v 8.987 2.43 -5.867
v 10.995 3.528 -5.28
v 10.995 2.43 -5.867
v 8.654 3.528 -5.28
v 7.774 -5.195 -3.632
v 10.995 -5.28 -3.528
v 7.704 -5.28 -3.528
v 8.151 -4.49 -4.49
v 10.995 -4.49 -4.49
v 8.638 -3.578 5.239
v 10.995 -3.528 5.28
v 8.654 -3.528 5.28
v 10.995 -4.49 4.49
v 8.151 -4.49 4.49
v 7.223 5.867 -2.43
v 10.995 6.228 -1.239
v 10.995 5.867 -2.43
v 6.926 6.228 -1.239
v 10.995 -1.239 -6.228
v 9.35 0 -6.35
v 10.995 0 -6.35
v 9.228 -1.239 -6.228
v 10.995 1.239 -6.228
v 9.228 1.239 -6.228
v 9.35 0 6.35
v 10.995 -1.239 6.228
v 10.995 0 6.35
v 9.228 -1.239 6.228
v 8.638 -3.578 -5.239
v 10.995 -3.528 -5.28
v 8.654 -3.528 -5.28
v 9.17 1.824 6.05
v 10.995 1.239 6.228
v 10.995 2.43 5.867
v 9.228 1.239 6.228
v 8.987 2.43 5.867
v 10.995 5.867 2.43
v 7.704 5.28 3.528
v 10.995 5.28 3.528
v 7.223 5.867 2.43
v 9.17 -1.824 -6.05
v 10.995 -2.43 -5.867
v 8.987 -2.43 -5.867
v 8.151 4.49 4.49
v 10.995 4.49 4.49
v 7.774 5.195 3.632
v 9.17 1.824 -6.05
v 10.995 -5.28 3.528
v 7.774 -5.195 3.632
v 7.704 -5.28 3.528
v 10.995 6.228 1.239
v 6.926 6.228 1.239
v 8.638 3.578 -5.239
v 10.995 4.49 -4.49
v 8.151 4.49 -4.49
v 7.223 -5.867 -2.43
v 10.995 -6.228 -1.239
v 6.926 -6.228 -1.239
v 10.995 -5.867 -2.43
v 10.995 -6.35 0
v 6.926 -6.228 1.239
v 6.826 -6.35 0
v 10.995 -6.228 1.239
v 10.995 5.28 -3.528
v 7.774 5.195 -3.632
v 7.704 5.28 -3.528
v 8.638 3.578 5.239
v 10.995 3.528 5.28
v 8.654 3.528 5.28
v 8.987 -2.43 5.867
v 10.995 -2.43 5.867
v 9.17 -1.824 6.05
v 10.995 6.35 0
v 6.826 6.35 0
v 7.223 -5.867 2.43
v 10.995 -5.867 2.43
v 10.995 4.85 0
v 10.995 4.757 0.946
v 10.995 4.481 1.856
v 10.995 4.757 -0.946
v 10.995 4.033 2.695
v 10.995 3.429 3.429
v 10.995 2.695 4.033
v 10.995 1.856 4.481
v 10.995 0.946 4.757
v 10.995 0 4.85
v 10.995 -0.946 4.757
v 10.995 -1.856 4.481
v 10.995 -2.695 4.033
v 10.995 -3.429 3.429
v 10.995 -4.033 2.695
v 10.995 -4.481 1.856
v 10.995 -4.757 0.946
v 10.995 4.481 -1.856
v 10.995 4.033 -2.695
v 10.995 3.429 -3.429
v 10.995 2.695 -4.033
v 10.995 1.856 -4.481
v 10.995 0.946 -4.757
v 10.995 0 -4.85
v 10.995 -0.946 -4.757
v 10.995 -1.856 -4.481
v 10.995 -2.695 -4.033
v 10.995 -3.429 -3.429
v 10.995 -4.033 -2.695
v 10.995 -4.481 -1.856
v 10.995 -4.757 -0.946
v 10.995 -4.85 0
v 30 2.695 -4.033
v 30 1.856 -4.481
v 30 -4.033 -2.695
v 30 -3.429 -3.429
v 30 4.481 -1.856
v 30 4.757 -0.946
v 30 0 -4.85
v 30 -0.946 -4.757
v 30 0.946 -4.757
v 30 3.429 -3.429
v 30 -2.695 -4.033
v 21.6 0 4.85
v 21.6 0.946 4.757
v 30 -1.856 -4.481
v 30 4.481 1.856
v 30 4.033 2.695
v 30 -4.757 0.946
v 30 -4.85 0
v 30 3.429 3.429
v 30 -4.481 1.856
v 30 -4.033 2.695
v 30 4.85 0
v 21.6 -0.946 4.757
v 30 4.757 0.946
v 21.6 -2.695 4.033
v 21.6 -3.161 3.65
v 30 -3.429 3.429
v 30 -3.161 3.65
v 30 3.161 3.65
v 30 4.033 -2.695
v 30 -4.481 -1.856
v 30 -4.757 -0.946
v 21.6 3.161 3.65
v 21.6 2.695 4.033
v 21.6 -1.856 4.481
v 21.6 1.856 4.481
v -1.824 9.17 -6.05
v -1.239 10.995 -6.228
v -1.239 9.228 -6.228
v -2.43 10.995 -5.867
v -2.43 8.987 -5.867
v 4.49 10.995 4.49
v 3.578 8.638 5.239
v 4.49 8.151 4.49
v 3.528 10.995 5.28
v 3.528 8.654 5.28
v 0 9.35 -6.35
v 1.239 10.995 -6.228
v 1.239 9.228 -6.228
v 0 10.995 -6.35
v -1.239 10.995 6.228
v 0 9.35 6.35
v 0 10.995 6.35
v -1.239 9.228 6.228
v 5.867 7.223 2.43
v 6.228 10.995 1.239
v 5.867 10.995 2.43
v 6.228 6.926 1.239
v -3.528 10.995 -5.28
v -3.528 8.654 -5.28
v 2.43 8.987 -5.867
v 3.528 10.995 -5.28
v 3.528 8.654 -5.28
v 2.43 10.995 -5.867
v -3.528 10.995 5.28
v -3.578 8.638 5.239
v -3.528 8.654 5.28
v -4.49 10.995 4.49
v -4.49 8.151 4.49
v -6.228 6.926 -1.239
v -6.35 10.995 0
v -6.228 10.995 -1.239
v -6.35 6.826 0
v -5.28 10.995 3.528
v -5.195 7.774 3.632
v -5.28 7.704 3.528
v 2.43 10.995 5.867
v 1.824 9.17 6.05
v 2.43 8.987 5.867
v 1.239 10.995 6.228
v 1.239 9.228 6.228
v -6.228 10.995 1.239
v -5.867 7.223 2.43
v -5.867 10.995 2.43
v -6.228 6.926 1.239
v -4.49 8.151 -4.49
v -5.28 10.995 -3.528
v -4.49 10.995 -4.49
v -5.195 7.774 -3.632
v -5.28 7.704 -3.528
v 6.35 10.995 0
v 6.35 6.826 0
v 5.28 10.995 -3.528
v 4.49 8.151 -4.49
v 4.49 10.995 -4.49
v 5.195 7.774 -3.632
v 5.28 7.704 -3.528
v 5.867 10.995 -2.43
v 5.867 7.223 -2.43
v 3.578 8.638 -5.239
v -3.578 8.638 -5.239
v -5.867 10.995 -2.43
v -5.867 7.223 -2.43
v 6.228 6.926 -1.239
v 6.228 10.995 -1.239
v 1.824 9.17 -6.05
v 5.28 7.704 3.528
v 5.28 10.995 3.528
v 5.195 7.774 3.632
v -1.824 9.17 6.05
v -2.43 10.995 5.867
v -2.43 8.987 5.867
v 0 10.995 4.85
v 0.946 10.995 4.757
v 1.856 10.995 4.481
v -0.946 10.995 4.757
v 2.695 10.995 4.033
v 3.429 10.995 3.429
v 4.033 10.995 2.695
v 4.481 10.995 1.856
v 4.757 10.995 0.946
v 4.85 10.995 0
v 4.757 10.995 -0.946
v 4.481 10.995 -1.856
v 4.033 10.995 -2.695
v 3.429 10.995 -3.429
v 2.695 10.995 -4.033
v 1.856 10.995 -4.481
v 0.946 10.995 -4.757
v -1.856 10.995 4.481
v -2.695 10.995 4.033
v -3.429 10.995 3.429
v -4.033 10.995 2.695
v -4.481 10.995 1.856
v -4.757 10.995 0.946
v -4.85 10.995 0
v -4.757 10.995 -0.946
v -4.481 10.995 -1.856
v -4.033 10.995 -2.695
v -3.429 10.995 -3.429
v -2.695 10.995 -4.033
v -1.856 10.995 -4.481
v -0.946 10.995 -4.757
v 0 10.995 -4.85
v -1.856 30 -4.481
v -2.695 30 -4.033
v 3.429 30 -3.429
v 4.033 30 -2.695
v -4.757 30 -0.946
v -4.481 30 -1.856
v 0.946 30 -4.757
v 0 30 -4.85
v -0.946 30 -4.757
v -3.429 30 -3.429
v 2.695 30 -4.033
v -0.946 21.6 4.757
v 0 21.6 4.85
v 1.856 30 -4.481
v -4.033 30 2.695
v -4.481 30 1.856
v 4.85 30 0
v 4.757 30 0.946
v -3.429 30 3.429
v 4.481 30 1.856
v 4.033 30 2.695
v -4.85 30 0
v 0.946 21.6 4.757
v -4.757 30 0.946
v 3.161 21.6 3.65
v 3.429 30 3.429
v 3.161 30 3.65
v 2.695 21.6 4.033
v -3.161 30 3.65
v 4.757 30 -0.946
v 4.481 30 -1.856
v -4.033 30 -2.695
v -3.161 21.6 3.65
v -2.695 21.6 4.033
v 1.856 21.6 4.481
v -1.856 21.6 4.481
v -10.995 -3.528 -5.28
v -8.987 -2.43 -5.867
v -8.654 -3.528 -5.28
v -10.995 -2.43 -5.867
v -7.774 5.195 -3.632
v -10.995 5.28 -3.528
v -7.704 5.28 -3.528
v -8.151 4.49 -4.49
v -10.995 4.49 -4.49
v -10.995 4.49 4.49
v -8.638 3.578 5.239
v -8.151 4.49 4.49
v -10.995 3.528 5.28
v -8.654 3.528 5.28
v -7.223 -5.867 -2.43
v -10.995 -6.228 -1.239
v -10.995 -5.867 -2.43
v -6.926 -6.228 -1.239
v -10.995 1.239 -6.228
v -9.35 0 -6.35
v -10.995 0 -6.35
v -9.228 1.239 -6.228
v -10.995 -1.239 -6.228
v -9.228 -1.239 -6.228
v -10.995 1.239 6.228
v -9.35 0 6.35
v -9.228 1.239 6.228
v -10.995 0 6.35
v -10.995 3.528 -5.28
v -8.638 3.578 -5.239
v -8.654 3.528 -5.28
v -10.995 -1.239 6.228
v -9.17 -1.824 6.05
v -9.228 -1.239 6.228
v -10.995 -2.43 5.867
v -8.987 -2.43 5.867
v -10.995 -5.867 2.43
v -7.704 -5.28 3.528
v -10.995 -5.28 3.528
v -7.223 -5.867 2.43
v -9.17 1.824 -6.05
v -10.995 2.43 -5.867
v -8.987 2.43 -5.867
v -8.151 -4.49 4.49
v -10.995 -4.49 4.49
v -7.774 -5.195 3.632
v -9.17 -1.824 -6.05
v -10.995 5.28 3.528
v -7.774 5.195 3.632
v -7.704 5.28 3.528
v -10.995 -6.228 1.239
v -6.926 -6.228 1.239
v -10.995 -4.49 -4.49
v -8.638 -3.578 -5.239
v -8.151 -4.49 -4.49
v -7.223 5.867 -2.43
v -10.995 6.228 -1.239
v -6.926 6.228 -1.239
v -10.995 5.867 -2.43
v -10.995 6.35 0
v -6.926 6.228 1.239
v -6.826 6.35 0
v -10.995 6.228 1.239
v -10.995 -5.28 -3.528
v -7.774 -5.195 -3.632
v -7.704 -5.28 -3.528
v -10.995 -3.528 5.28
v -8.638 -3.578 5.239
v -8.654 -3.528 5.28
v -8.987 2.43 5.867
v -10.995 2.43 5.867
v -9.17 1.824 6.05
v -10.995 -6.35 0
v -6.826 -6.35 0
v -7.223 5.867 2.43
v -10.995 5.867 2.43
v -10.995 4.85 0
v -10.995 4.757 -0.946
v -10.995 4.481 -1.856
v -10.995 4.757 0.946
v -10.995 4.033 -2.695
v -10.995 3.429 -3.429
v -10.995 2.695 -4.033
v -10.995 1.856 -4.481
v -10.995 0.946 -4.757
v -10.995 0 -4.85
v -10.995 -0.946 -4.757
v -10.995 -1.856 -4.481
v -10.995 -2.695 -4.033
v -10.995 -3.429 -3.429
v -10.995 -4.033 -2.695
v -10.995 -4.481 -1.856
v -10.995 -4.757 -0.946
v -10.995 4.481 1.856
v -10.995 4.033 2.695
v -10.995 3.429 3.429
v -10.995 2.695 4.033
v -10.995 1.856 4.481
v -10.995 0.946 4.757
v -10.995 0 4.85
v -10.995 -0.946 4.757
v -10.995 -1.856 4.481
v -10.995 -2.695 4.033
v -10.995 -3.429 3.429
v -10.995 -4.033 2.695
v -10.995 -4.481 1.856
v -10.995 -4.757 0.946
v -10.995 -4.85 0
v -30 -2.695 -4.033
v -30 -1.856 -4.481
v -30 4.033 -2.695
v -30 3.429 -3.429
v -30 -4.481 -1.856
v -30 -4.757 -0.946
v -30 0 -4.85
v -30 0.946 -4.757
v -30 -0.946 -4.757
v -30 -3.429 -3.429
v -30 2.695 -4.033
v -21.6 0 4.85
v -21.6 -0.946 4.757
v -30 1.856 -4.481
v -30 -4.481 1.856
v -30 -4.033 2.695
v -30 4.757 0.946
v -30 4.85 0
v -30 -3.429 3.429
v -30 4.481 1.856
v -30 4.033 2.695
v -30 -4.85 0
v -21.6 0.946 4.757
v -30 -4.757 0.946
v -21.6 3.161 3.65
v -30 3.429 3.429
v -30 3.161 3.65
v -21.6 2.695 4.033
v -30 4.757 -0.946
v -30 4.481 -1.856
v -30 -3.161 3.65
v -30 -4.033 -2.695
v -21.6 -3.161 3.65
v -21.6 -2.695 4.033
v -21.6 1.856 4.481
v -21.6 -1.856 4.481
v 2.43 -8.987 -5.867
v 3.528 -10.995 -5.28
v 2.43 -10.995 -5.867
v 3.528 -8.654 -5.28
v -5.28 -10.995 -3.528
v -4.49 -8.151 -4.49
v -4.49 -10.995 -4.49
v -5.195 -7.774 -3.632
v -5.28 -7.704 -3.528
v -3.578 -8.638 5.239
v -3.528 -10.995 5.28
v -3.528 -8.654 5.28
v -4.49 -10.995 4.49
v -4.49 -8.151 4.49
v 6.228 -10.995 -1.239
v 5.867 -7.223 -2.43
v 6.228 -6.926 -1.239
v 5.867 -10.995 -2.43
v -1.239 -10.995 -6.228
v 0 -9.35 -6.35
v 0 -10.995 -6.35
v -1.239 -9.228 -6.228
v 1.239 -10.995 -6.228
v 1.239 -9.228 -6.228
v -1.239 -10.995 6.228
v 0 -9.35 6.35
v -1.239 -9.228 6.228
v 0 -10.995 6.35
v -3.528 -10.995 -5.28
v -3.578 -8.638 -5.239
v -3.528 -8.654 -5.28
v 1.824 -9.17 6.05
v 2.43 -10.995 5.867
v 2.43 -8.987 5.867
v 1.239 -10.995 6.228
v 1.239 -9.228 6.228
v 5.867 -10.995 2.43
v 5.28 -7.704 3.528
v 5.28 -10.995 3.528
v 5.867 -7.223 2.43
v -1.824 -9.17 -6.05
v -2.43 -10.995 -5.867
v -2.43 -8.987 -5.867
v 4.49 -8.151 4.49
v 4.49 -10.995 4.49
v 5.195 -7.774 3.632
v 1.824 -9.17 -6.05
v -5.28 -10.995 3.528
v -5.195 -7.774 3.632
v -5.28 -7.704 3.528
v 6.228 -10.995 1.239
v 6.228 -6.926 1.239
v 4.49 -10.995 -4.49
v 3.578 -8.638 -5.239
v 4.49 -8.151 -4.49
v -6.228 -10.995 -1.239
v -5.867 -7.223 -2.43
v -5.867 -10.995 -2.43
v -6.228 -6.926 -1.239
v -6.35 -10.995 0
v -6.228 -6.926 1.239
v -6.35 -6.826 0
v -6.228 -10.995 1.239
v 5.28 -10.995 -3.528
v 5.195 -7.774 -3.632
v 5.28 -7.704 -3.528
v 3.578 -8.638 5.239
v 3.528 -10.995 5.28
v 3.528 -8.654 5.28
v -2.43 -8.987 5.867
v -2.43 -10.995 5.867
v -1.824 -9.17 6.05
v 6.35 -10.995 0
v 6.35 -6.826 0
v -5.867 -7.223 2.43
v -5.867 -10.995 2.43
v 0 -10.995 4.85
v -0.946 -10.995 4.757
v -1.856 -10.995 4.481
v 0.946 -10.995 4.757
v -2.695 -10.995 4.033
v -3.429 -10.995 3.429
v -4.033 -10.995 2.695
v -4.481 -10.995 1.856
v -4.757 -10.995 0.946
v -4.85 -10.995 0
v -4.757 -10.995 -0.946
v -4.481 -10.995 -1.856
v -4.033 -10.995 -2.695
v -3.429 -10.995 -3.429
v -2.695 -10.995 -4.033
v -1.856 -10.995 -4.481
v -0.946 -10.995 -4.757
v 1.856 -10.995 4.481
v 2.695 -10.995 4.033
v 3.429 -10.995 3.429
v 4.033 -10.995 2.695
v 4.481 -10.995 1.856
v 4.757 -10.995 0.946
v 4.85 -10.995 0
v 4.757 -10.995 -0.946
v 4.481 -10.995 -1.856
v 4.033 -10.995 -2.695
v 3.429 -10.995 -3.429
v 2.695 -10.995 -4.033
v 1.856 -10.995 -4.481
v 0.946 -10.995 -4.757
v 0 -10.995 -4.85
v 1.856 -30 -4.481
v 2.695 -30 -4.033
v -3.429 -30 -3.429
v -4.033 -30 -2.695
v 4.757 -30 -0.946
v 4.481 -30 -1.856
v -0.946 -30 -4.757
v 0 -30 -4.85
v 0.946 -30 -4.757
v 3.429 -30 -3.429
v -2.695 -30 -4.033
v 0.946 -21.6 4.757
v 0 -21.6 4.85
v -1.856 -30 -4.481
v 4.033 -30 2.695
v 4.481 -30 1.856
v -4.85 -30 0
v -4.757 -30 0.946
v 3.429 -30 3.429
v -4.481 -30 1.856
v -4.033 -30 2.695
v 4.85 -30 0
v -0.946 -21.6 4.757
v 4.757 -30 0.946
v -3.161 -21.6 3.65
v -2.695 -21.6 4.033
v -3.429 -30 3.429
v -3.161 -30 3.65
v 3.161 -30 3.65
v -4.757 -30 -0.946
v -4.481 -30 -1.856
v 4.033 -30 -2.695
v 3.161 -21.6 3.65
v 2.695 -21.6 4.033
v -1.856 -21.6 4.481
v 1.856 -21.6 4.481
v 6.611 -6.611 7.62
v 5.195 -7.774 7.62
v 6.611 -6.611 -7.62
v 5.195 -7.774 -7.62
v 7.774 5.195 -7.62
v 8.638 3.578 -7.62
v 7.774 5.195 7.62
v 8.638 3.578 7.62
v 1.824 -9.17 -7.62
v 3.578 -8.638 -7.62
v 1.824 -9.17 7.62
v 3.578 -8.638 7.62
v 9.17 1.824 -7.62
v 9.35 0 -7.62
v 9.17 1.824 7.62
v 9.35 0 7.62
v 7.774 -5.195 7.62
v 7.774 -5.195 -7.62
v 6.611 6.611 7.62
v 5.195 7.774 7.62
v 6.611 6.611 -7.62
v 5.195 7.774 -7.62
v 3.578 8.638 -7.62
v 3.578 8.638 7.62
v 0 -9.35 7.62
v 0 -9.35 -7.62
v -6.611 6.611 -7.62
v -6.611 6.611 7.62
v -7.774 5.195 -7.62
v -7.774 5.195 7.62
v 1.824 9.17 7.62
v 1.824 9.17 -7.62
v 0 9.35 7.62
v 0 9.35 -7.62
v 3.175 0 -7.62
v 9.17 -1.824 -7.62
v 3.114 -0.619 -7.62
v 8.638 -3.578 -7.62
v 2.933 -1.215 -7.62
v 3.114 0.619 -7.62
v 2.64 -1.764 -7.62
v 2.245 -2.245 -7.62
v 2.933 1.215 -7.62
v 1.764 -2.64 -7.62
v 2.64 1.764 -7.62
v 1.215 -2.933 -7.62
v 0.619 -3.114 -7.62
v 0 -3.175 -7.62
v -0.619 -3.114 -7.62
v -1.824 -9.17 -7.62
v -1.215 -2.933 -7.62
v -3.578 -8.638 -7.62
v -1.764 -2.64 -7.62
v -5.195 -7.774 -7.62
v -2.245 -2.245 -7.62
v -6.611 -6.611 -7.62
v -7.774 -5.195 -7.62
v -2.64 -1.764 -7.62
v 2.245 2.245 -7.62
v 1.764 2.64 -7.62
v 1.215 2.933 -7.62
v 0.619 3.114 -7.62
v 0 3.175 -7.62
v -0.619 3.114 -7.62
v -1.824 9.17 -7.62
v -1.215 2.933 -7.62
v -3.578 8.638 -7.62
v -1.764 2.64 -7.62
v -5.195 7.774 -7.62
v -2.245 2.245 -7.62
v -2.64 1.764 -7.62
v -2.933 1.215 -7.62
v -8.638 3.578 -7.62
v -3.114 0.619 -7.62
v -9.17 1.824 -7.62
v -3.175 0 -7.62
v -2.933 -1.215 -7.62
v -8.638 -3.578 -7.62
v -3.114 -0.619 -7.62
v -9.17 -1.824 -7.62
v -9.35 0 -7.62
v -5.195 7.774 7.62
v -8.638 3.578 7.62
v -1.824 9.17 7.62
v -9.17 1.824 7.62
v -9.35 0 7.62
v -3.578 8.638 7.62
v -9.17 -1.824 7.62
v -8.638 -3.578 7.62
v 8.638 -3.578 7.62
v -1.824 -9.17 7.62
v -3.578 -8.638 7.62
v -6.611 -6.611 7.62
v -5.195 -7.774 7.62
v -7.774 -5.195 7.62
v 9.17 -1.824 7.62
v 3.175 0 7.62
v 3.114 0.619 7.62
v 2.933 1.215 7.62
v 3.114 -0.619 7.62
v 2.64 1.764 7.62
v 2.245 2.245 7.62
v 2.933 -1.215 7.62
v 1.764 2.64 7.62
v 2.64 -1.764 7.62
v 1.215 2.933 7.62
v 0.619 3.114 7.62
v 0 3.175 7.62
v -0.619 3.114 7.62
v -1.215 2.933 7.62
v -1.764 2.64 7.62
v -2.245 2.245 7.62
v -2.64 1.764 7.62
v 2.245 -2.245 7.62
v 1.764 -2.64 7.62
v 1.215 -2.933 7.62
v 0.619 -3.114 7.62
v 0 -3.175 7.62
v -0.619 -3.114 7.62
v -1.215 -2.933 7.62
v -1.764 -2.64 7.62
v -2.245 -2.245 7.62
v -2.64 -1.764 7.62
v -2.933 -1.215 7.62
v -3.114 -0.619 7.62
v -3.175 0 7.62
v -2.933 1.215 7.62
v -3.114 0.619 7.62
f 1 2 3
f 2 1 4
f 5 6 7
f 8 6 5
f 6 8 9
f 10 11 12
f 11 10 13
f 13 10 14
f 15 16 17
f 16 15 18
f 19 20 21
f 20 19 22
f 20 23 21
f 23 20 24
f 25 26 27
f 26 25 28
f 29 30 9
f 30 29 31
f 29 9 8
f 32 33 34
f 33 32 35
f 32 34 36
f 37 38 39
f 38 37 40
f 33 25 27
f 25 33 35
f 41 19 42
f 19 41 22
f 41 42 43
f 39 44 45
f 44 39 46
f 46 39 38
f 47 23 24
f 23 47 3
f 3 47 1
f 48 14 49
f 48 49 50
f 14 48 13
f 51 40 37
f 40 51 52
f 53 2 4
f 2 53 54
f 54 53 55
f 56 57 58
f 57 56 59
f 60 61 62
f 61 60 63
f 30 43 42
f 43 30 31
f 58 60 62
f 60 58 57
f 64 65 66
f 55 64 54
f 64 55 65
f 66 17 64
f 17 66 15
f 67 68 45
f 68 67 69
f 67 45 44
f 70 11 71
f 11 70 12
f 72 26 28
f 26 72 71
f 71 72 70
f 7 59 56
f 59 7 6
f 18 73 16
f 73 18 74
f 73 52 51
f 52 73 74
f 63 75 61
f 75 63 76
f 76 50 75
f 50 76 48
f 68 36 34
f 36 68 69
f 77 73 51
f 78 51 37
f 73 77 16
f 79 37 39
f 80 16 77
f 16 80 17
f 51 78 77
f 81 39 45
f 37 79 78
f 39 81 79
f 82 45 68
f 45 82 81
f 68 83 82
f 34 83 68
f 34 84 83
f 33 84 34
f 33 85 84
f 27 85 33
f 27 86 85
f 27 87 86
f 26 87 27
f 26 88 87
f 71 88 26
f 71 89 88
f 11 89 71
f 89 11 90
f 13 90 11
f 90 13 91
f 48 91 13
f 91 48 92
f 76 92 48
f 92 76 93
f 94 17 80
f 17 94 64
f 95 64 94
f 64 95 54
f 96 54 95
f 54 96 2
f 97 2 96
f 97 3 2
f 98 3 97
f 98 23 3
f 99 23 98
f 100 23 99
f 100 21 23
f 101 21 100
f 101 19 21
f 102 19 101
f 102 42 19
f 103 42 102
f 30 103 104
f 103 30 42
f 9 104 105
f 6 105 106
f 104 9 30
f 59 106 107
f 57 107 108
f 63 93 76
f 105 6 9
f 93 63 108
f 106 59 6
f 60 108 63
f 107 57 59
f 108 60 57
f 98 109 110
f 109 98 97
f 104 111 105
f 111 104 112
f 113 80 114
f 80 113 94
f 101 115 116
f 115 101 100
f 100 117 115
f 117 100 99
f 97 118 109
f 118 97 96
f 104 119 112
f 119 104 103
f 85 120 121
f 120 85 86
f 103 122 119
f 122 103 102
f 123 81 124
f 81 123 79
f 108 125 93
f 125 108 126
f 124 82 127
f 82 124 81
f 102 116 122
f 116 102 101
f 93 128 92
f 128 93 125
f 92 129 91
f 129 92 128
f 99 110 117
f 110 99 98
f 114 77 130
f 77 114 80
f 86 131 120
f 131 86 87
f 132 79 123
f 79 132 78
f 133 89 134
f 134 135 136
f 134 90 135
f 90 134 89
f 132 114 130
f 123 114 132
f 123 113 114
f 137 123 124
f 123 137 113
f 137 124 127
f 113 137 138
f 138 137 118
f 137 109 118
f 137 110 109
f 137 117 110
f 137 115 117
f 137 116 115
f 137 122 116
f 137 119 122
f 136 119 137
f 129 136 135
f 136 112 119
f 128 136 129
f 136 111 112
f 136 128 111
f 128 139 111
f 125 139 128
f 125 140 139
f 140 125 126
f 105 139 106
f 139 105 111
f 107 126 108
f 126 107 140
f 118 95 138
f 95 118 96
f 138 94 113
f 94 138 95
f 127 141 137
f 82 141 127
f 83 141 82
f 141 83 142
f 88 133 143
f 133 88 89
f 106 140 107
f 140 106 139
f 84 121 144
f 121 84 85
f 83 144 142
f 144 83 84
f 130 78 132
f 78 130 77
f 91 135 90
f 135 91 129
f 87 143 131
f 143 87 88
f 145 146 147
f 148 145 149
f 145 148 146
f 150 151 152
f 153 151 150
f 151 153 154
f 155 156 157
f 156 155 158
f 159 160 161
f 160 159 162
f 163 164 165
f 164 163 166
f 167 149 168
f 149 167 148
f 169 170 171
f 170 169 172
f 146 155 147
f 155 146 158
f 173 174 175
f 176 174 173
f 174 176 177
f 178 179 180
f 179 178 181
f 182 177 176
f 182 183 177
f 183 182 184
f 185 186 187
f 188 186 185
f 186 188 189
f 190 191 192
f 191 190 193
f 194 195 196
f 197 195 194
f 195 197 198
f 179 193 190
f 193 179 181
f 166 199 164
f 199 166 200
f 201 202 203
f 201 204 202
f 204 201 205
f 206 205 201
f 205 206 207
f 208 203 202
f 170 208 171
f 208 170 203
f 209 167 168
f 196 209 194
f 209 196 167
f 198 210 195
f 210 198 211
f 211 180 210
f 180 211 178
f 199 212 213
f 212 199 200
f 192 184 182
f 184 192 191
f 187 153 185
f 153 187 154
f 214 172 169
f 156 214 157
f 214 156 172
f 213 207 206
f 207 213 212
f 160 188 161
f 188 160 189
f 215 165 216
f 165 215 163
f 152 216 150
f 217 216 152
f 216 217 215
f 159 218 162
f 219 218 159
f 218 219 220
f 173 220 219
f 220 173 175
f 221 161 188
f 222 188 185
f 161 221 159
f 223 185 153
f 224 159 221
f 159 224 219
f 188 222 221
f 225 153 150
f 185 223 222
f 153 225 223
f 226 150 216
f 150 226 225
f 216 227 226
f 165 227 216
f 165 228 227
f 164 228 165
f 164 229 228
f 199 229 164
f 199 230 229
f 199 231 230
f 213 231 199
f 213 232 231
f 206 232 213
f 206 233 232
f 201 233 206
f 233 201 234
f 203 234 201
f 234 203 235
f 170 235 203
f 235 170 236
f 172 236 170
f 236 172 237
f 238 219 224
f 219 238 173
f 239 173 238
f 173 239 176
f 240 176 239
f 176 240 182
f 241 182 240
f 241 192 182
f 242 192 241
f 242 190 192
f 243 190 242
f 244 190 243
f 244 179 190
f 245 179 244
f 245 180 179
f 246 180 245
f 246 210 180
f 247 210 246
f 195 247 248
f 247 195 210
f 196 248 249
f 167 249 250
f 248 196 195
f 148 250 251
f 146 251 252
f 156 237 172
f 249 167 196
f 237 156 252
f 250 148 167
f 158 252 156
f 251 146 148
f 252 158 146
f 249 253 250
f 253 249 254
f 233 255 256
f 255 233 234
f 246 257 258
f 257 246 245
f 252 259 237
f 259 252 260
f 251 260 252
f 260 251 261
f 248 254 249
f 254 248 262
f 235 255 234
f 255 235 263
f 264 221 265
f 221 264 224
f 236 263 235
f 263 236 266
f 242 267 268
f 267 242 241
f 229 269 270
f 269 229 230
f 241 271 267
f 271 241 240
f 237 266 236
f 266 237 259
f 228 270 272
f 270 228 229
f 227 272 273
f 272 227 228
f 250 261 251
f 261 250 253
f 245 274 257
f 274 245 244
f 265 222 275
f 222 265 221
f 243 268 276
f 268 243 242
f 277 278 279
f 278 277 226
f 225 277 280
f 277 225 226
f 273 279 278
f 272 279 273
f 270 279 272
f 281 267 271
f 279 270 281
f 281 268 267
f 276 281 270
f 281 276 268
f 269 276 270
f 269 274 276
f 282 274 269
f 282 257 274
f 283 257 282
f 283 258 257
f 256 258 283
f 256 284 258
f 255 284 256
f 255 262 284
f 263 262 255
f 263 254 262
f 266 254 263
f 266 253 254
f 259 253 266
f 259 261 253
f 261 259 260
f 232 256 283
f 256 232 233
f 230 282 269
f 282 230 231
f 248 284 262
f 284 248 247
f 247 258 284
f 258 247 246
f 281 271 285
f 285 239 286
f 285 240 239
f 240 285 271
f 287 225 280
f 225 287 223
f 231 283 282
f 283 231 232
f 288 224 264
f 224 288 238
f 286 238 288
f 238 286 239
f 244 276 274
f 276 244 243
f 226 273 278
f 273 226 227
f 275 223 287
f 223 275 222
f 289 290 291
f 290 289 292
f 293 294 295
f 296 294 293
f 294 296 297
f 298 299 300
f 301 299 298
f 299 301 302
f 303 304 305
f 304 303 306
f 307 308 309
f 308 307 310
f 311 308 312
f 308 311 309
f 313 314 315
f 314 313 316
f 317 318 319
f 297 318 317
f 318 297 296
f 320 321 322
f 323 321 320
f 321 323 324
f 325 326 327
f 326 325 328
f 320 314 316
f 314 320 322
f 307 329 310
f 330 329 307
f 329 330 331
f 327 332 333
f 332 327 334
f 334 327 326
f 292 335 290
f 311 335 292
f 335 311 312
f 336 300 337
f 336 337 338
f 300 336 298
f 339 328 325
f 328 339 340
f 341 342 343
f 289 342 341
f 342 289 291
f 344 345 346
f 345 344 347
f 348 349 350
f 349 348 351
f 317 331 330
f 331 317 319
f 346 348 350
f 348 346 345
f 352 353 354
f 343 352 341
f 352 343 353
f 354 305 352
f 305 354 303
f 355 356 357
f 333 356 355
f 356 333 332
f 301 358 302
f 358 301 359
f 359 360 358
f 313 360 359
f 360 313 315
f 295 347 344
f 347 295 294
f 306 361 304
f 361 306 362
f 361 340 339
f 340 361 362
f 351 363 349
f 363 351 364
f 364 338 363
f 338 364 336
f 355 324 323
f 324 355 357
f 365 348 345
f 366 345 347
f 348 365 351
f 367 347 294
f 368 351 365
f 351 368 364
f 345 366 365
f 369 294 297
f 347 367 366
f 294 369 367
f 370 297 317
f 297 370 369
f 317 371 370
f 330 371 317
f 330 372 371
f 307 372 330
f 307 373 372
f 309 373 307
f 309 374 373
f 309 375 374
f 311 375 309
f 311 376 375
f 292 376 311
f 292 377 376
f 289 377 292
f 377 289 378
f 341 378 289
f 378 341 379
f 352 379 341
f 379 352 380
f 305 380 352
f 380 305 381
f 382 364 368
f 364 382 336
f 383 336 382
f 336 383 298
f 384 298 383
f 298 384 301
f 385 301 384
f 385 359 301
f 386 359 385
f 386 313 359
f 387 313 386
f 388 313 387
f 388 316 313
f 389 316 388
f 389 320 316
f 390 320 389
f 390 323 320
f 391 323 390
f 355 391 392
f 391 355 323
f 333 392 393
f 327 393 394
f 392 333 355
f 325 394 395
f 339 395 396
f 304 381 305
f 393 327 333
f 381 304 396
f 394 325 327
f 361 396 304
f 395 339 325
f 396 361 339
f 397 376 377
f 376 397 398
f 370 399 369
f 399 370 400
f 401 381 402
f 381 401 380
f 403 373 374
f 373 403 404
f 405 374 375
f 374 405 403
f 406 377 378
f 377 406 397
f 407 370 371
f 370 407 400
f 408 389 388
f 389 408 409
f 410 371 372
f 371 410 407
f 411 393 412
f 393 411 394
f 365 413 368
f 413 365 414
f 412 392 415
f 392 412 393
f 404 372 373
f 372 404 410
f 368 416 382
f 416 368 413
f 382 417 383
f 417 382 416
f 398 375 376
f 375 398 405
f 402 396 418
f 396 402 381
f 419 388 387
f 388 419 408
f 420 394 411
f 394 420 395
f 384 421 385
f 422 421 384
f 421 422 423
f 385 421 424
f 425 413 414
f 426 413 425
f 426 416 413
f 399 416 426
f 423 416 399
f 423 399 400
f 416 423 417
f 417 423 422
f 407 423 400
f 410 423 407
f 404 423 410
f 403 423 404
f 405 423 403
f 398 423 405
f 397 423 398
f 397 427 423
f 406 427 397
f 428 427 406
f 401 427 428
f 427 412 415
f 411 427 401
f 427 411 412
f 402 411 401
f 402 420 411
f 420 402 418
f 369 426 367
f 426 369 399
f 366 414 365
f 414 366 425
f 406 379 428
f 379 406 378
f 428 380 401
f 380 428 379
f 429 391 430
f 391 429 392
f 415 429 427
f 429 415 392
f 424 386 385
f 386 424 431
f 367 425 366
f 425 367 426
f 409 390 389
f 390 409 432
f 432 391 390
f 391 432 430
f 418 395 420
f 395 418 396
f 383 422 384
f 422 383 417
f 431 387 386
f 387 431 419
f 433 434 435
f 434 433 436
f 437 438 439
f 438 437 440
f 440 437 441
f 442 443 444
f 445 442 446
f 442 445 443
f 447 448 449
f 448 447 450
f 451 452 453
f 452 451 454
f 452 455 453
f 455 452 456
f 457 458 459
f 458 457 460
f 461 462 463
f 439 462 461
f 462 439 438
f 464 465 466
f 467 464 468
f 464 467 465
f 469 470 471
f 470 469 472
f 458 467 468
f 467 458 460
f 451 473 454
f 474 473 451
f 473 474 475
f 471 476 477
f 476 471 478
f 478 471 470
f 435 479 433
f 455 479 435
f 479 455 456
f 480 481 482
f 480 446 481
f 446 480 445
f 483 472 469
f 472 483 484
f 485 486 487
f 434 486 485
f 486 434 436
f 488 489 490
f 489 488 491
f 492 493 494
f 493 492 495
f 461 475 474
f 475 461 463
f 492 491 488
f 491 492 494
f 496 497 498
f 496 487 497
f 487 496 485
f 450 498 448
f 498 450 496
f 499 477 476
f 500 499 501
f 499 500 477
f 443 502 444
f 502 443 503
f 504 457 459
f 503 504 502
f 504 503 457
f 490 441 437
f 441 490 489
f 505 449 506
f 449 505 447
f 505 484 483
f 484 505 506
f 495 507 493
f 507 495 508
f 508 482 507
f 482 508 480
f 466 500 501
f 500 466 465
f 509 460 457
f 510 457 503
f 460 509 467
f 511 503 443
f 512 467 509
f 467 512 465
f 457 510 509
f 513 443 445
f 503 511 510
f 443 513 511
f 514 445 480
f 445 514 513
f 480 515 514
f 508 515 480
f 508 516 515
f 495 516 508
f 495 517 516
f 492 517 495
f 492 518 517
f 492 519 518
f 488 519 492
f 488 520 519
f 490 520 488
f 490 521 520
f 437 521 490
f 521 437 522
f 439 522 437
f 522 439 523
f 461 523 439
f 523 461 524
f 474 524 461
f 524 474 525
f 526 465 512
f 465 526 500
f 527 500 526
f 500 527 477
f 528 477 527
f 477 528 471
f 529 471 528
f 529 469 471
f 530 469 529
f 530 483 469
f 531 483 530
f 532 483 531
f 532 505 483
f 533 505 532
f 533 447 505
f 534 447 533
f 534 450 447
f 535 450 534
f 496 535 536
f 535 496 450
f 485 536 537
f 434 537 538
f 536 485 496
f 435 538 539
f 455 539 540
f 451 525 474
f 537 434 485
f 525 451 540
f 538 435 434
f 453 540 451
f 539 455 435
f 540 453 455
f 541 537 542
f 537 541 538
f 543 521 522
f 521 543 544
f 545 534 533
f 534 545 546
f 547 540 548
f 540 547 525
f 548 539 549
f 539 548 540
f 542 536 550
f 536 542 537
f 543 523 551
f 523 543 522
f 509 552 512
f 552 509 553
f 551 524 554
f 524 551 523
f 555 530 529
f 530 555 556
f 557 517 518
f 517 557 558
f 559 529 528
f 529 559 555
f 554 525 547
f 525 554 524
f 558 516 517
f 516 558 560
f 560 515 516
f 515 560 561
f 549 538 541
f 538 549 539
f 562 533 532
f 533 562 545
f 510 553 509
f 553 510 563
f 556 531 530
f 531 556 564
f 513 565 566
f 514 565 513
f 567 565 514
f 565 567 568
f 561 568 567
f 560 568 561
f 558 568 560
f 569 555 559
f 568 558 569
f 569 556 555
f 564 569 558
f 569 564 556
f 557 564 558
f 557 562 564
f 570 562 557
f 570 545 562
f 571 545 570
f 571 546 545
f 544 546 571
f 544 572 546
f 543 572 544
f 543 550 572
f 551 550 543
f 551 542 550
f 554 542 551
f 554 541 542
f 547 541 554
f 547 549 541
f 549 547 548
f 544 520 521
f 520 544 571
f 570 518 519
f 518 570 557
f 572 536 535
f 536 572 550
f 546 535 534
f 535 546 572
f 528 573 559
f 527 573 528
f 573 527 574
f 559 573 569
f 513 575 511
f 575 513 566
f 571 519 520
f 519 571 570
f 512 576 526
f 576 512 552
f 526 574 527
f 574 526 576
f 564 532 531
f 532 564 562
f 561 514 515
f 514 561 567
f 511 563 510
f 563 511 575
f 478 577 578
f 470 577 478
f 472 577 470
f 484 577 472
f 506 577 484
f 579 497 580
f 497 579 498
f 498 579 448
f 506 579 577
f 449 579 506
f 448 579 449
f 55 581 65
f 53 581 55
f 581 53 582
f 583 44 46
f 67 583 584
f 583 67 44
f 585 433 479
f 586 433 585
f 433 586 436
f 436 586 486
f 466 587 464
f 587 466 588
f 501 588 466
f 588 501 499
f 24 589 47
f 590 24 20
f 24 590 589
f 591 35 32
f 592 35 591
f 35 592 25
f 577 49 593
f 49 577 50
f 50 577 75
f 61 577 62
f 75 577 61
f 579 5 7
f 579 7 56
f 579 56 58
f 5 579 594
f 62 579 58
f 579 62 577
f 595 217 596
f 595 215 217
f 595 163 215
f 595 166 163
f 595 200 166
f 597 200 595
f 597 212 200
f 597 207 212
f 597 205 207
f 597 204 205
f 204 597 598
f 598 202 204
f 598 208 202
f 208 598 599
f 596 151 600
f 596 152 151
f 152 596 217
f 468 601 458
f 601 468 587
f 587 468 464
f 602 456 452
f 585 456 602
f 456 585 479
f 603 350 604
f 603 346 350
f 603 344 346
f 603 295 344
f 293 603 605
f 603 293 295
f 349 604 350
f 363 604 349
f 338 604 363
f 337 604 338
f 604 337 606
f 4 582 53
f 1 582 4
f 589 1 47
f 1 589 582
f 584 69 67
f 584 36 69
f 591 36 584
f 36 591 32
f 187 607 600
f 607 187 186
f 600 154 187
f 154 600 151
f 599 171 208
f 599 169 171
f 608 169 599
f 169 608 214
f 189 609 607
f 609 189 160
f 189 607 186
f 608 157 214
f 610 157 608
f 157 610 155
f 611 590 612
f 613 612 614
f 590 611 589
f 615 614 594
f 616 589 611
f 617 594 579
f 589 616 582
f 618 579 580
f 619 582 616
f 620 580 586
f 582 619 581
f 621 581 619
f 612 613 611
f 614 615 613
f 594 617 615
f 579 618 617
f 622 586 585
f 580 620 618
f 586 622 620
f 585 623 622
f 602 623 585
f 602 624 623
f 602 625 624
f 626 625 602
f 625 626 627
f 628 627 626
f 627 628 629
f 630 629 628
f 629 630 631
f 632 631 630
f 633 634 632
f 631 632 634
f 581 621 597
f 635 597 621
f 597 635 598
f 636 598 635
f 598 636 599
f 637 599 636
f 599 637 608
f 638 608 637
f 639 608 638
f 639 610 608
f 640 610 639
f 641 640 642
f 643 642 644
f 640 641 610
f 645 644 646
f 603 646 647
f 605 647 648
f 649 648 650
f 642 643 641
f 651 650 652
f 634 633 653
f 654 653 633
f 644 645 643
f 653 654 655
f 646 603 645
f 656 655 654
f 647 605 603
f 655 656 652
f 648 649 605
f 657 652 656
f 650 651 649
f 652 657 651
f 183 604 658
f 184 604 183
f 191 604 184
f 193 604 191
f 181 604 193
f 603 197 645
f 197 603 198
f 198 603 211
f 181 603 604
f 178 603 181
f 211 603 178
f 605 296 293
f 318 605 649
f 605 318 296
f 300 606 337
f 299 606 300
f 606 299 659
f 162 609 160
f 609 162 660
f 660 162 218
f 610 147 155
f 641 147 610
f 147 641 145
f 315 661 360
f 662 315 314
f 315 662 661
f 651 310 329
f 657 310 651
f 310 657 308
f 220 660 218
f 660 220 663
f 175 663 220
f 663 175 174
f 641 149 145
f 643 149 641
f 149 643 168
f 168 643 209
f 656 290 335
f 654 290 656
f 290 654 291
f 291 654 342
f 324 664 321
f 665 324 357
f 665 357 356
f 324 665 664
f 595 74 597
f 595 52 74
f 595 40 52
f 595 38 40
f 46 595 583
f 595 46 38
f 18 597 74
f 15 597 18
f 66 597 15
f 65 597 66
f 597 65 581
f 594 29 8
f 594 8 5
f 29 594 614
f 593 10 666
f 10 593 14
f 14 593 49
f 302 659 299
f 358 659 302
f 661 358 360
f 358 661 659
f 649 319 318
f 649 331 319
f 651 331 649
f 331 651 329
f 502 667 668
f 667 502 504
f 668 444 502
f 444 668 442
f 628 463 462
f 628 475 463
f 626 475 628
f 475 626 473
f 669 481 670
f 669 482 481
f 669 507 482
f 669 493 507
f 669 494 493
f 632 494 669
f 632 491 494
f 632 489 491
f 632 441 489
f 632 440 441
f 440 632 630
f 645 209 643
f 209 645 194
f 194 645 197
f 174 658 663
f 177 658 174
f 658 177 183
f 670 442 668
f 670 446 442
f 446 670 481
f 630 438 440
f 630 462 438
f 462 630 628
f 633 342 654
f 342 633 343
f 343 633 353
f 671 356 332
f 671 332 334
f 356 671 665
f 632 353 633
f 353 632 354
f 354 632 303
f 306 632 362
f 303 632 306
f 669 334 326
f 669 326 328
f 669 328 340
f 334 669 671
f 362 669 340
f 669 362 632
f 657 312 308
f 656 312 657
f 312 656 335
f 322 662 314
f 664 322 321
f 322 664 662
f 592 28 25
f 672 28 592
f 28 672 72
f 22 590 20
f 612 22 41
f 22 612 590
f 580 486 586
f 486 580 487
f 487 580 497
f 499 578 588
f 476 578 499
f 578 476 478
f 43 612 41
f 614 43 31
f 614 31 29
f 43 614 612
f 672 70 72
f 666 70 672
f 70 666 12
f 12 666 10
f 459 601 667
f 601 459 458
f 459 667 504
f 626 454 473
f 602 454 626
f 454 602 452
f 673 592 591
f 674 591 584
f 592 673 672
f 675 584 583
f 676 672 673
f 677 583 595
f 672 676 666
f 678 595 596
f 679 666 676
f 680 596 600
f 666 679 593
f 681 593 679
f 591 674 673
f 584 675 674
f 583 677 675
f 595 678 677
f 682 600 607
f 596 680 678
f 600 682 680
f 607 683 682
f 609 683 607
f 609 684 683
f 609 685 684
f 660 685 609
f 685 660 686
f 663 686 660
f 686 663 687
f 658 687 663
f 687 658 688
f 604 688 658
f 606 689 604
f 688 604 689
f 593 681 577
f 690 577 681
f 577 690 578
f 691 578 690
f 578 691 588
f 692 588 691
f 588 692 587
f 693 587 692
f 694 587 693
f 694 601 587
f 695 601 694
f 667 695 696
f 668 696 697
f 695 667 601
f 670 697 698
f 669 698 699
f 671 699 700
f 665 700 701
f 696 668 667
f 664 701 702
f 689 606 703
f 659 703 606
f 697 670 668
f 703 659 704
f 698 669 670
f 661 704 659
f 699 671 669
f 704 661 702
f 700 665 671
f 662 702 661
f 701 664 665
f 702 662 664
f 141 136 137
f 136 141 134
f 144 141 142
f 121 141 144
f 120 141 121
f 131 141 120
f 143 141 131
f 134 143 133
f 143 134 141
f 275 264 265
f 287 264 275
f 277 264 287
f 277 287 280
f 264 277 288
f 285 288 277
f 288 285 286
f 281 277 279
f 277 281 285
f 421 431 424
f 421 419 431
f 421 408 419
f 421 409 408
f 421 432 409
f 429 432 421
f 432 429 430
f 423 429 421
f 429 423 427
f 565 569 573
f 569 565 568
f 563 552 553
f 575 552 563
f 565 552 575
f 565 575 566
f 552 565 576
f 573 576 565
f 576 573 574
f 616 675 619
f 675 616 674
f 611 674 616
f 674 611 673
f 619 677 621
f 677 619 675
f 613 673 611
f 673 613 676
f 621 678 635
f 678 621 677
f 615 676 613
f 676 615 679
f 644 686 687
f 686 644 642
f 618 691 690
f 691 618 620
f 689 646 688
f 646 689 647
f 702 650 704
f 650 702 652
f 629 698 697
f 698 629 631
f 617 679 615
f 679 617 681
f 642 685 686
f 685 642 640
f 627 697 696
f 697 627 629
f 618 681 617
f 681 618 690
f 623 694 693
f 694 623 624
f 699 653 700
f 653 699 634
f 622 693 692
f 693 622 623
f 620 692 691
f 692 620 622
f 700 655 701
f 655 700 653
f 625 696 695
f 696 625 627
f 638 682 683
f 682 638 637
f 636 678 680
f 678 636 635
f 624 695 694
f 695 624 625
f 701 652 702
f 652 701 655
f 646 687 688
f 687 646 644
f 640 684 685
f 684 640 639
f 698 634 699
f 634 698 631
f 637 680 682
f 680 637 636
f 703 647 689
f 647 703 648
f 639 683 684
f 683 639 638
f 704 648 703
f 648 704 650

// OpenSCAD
$fn = 32;

// ----------------------------------------------------------------------
// Cardan cross: 60 mm span, 12.7 mm trunnions
// ----------------------------------------------------------------------

// --- parameters (mm) ---
journal_d = 12.7;         // trunnion diameter
arm_len = 30;             // trunnion length from the centre
step_r = 4.32;            // step position from the centre
step_d = 9.7;             // journal diameter after the step
hub_d = 18.7;             // hub diameter
hub_h = 15.24;            // hub height
bore_d = 6.35;            // hub bore
flat_d = 1.2;             // depth of the journal flat
flat_len = 8.4;           // length of the journal flat

difference() {
  union() {
    /* hub along the joint axis */
    cylinder(h = hub_h, d = hub_d, center = true);
    for (a = [0 : 90 : 270]) rotate([0, 0, a]) {
      /* trunnion, sunk into the hub */
      translate([hub_d / 4, 0, 0]) rotate([0, 90, 0]) cylinder(h = step_r + 2, d = journal_d);
      /* stepped journal out to the tip */
      translate([step_r - 0.5, 0, 0]) rotate([0, 90, 0]) cylinder(h = arm_len + 0.5 - step_r, d = step_d);
    }
  }
  /* lubrication bore through the hub, 2.5 mm clear on both sides */
  translate([0, 0, -hub_h / 2 - 2.5]) cylinder(h = hub_h + 5, d = bore_d);
  /* machined flat on each journal tip */
  for (a = [0 : 90 : 270]) rotate([0, 0, a]) {
    translate([arm_len - flat_len, -step_d, step_d / 2 - flat_d]) cube([flat_len + 0.5, 2 * step_d, flat_d + 2.5]);
  }
}
